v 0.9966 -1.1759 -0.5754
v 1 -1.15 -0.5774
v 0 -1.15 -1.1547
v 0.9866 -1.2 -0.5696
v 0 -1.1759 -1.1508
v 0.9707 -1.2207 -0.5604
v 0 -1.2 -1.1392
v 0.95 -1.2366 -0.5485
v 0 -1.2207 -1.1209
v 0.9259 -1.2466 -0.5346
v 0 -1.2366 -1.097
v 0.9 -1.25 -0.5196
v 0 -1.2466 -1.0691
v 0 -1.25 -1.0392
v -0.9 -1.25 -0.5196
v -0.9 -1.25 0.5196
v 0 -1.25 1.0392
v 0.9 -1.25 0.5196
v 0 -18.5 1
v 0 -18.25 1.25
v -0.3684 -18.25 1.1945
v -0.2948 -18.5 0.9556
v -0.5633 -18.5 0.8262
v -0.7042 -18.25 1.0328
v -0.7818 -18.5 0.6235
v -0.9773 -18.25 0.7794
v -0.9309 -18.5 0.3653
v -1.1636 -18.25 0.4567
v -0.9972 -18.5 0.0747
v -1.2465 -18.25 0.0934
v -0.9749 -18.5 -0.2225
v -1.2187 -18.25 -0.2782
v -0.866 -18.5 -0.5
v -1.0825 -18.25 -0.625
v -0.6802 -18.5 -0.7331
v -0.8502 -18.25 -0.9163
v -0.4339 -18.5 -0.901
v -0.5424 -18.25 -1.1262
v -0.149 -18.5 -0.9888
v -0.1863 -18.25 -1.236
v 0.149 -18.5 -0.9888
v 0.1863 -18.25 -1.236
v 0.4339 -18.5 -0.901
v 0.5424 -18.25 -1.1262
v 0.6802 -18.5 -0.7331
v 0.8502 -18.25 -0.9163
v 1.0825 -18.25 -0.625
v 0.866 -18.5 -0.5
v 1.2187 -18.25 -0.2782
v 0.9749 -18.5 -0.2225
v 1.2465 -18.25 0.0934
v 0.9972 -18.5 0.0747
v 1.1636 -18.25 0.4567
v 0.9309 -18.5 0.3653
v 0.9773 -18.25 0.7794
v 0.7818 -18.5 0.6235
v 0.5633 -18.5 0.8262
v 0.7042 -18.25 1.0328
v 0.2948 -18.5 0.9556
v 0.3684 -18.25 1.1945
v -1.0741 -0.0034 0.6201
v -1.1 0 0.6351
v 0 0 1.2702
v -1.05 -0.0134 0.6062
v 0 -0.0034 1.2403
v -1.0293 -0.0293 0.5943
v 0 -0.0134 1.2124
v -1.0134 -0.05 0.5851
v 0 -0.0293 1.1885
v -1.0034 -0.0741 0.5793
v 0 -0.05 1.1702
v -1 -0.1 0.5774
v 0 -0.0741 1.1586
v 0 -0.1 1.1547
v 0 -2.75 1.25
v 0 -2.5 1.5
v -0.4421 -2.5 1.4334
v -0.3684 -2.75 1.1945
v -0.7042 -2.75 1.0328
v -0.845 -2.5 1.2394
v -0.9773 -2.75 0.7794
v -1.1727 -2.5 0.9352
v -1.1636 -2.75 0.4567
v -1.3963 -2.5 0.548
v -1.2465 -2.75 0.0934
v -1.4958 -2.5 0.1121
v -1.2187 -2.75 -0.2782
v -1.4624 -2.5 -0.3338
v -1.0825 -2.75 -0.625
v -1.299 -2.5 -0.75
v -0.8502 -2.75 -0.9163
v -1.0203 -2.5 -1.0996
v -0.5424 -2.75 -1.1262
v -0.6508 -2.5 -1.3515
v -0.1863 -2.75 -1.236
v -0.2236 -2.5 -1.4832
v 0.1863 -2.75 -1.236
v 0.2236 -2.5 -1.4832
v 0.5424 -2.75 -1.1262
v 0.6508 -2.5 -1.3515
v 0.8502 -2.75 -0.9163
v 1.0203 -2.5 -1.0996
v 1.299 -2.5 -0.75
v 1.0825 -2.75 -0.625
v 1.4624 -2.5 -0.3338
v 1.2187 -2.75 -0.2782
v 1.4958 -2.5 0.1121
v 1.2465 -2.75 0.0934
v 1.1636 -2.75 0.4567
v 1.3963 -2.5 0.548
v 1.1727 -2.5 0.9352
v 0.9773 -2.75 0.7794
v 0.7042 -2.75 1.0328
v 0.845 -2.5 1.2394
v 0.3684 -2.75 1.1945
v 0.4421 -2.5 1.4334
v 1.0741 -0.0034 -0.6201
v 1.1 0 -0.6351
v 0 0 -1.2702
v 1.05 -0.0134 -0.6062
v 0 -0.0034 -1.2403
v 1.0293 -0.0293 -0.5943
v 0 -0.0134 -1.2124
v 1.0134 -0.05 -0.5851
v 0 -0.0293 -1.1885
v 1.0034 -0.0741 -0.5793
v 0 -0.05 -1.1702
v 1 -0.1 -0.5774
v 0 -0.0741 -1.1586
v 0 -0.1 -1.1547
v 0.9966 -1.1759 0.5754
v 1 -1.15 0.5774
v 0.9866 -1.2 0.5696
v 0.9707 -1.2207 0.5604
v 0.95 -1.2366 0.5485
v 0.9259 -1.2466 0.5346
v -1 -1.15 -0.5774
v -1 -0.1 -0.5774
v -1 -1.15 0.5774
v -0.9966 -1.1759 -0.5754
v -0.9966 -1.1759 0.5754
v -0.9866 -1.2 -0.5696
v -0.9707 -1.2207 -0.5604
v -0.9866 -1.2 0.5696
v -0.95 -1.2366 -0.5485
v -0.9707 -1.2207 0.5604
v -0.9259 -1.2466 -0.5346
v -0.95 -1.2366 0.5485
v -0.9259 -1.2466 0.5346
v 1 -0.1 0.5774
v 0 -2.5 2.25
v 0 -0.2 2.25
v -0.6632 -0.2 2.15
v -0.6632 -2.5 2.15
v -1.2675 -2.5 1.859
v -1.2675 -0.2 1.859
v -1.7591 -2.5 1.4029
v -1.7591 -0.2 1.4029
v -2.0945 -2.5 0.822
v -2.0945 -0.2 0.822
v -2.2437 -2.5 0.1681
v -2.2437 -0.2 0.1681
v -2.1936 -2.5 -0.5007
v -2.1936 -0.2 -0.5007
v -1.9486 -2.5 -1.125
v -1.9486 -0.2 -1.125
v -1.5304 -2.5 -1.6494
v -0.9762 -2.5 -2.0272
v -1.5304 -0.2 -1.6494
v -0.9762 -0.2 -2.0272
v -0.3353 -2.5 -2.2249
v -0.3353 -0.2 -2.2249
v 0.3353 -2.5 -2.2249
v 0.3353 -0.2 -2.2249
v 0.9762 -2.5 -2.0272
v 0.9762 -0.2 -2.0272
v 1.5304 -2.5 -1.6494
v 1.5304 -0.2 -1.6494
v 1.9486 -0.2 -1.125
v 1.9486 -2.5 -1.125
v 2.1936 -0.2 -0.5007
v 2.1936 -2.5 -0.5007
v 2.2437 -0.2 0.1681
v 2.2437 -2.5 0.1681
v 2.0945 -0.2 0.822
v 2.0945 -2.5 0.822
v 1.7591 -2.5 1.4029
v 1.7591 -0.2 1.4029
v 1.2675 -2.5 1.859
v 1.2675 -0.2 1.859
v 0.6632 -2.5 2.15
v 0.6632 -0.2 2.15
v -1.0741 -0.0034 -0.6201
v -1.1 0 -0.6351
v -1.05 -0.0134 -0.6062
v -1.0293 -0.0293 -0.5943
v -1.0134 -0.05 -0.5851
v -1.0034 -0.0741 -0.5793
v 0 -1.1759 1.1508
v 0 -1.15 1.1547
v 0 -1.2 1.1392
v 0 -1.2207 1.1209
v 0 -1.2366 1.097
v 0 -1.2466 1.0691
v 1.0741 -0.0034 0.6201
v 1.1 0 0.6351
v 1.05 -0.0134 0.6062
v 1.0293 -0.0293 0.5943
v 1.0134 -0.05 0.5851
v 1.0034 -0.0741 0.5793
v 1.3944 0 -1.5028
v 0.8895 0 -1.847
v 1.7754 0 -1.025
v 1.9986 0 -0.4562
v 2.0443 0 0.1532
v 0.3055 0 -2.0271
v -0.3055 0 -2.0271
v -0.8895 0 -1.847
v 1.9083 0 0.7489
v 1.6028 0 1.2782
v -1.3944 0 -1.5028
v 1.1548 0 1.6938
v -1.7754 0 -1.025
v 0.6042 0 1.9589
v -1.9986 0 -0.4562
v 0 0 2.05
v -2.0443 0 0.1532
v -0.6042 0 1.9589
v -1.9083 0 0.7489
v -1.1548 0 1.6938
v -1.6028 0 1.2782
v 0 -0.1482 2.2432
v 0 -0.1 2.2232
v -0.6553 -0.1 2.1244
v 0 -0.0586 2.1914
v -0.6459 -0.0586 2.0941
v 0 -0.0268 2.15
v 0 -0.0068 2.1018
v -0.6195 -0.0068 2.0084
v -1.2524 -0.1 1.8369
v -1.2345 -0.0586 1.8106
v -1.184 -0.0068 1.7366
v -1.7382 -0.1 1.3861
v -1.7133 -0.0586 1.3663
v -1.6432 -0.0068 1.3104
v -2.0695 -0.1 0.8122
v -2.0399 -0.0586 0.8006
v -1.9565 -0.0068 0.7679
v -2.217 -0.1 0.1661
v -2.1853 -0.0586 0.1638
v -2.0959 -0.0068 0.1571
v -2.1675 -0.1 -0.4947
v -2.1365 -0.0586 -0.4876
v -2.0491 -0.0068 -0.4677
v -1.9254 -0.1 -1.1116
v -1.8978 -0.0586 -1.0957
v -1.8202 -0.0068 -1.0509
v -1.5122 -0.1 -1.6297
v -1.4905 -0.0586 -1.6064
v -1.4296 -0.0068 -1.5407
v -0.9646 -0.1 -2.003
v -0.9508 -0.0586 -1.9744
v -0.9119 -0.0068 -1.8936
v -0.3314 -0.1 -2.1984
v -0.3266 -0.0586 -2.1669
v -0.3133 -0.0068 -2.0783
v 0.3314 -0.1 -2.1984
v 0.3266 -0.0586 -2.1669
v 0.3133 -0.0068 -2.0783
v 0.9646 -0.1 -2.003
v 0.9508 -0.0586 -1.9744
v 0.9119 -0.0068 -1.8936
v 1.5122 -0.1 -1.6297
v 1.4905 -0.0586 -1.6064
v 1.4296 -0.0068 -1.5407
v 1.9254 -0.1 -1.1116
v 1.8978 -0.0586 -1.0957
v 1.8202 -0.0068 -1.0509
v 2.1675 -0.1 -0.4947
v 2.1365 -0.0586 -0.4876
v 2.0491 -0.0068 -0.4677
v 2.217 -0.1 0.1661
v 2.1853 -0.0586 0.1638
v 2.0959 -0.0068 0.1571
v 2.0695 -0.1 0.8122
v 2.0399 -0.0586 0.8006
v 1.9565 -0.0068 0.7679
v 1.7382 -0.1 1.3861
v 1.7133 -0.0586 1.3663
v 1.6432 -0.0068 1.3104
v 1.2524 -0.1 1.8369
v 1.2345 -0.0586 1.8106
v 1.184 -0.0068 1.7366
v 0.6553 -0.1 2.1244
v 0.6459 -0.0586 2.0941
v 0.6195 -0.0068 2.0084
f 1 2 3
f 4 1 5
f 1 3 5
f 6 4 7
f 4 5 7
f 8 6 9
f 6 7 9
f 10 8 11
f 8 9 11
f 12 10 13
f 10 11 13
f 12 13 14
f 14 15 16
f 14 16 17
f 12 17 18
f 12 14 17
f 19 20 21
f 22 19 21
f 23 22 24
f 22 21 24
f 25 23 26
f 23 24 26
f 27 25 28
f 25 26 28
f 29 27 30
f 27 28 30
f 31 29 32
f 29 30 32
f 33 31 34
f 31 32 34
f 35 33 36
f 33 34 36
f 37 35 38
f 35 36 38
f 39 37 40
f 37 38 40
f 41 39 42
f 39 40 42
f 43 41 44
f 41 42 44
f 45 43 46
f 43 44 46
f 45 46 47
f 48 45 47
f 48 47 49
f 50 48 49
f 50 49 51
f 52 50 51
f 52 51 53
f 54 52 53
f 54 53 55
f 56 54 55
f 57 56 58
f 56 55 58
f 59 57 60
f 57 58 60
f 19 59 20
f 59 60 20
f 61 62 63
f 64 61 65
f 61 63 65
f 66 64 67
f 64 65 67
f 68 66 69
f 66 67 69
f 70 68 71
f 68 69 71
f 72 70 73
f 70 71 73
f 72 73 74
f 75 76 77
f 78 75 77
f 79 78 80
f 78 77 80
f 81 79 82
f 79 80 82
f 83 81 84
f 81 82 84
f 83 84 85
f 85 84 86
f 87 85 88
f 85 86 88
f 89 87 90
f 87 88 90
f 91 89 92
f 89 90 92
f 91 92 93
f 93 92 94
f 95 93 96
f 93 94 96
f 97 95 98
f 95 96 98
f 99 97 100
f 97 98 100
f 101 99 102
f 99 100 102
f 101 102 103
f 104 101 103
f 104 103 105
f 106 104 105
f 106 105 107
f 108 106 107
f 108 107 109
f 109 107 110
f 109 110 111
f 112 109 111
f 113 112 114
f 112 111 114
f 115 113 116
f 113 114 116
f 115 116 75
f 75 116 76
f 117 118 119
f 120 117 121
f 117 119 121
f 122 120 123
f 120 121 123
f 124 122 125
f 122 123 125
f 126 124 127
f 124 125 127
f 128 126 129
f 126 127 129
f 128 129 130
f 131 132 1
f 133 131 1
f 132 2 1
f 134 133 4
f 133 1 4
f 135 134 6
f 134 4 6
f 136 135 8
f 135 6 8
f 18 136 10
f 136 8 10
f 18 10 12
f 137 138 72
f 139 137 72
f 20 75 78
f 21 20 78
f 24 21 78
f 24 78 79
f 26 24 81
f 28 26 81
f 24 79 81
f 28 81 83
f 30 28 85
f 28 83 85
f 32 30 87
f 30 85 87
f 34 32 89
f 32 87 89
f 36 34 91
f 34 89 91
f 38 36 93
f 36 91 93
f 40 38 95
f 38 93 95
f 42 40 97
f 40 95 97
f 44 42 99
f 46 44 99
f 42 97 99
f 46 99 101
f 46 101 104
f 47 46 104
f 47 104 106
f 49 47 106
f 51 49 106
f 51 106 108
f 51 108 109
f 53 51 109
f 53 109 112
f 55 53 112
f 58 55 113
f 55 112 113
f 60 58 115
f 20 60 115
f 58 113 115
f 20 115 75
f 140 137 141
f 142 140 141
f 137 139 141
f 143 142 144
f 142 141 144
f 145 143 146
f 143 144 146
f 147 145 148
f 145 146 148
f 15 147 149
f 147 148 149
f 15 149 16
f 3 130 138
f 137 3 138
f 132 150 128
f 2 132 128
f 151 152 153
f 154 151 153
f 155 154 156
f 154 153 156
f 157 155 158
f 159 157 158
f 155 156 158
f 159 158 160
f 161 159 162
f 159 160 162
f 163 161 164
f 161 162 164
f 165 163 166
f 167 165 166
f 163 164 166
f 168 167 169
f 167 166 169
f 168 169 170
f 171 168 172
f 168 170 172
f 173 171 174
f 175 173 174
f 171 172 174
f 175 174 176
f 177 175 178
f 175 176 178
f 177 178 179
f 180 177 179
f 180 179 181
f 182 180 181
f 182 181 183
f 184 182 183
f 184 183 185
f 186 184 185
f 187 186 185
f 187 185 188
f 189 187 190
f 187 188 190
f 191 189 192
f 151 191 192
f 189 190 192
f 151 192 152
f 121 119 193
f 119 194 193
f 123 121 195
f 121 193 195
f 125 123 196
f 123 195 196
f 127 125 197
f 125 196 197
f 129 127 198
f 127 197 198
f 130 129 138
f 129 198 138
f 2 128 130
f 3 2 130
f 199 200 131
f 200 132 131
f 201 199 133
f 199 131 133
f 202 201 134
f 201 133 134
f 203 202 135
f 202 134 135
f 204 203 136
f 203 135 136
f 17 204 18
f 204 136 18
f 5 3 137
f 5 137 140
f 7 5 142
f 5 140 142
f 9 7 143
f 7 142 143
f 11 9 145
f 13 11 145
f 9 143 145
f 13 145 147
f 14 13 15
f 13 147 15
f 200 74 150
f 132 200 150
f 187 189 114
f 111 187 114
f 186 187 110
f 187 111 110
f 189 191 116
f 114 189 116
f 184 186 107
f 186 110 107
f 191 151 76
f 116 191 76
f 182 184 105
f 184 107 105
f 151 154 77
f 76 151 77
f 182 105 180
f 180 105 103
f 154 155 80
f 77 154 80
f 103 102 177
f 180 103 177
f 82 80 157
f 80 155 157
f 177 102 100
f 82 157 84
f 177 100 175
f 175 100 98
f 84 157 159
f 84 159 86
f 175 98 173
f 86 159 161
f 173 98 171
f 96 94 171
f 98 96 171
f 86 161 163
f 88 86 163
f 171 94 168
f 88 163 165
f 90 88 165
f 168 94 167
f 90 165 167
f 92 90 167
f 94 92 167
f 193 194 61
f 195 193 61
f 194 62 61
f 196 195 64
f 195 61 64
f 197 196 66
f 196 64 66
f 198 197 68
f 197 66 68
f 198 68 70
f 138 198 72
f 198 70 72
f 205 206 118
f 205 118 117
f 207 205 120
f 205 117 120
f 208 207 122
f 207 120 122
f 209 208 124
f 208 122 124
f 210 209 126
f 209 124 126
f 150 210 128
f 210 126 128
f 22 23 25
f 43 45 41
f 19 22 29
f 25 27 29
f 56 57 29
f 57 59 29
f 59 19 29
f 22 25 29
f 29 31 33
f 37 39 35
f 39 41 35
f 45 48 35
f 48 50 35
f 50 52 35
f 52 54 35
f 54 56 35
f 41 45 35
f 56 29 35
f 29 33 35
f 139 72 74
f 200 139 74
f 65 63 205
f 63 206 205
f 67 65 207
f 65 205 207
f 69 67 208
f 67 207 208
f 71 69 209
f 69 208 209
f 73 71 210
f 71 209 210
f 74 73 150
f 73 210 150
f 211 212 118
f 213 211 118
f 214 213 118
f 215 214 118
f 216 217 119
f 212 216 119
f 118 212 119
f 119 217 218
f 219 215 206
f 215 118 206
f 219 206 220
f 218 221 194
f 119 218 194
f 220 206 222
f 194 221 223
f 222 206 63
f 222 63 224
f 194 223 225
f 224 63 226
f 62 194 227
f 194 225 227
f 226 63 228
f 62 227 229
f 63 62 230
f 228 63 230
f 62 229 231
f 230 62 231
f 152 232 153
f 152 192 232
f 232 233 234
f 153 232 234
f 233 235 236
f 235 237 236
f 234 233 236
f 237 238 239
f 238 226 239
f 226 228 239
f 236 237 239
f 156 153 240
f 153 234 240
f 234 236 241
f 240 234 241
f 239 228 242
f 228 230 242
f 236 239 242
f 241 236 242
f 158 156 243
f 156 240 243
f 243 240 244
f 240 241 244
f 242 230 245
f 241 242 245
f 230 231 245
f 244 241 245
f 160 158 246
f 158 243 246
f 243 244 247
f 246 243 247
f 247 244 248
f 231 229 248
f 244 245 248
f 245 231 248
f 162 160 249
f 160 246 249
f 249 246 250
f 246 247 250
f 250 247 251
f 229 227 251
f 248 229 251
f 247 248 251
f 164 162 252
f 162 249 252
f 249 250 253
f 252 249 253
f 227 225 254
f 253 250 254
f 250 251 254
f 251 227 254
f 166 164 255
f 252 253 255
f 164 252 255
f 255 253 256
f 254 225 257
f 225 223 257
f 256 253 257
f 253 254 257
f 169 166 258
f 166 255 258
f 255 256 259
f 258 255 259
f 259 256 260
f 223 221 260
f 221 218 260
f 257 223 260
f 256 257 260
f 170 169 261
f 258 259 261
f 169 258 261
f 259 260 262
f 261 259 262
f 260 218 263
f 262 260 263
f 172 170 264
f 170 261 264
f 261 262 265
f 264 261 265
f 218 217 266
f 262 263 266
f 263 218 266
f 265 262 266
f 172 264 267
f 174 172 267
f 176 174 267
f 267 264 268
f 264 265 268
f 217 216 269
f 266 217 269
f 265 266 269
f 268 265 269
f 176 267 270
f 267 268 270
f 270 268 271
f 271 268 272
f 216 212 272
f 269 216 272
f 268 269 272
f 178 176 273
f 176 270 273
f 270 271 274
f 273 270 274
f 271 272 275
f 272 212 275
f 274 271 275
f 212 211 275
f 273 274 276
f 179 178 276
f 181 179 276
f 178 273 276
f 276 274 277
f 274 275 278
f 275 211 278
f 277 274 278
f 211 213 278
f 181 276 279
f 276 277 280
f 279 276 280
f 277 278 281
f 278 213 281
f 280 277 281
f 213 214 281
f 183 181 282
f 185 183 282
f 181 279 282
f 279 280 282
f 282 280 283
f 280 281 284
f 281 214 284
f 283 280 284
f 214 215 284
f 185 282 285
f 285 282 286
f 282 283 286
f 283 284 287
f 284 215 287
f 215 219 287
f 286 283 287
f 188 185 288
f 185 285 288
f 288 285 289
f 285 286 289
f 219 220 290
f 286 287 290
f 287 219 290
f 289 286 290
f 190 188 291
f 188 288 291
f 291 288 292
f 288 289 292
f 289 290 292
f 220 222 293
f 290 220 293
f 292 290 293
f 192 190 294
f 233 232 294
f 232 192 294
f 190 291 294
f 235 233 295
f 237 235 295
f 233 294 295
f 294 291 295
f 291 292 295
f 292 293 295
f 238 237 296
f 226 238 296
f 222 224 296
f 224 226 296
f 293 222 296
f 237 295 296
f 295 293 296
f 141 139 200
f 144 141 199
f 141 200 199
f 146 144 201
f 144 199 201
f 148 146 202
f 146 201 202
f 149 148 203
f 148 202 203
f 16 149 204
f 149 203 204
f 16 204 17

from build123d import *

# Parameters (mm, degrees)
CHAMFER1_SIZE      = 0.25
FILLET1_R          = 0.2
CUT_EXTRUDE1_DEPTH = 1.25
FILLET2_R          = 0.1


with BuildPart() as part:
    # Sketch1 → Revolve1 (revolve)
    with BuildSketch(Plane.XY, mode=Mode.PRIVATE) as revolve1_sk:
        Polygon((0, -18.5), (-1.25, -18.5), (-1.25, -2.5), (-2.25, -2.5), (-2.25, 0), (0, 0), align=None)
    revolve(revolve1_sk.sketch.rotate(Axis((0, 0, 0), (0, -1, 0)), 270), axis=Axis((0, 0, 0), (0, -1, 0)))

    # Chamfer1
    chamfer1_edges = [part.edges().sort_by_distance(p)[0] for p in [
        (0, -2.5, -1.25),
        (0, -18.5, -1.25),
    ]]
    chamfer(chamfer1_edges, length=CHAMFER1_SIZE)

    # Fillet1
    fillet1_edges = [part.edges().sort_by_distance(p)[0] for p in [
        (0, 0, -2.25),
    ]]
    fillet(fillet1_edges, radius=FILLET1_R)

    # Sketch2 → Cut-Extrude1 (cut)
    with BuildSketch(Plane(origin=(0, 0, 0), x_dir=(1, 0, 0), z_dir=(0, 1, 0))):
        Polygon((0, 1.154700538), (-1, 0.577350269), (-1, -0.577350269), (0, -1.154700538), (1, -0.577350269), (1, 0.577350269), align=None)
    extrude(amount=-CUT_EXTRUDE1_DEPTH, mode=Mode.SUBTRACT)

    # Fillet2
    fillet2_edges = [part.edges().sort_by_distance(p)[0] for p in [
        (0.5, -1.25, -0.866025404),
        (1, -1.25, 0),
        (0.5, -1.25, 0.866025404),
        (-0.5, -1.25, 0.866025404),
        (-1, -1.25, 0),
        (-0.5, -1.25, -0.866025404),
        (0.4999999999999987, 0, -0.8660254037844397),
        (-0.5000000000000006, 0, -0.8660254037844395),
        (-1, 0, 0),
        (-0.5000000000000007, 0, 0.8660254037844379),
        (0.4999999999999988, 0, 0.8660254037844382),
        (1, 0, 0),
    ]]
    fillet(fillet2_edges, radius=FILLET2_R)


solid = part.part
